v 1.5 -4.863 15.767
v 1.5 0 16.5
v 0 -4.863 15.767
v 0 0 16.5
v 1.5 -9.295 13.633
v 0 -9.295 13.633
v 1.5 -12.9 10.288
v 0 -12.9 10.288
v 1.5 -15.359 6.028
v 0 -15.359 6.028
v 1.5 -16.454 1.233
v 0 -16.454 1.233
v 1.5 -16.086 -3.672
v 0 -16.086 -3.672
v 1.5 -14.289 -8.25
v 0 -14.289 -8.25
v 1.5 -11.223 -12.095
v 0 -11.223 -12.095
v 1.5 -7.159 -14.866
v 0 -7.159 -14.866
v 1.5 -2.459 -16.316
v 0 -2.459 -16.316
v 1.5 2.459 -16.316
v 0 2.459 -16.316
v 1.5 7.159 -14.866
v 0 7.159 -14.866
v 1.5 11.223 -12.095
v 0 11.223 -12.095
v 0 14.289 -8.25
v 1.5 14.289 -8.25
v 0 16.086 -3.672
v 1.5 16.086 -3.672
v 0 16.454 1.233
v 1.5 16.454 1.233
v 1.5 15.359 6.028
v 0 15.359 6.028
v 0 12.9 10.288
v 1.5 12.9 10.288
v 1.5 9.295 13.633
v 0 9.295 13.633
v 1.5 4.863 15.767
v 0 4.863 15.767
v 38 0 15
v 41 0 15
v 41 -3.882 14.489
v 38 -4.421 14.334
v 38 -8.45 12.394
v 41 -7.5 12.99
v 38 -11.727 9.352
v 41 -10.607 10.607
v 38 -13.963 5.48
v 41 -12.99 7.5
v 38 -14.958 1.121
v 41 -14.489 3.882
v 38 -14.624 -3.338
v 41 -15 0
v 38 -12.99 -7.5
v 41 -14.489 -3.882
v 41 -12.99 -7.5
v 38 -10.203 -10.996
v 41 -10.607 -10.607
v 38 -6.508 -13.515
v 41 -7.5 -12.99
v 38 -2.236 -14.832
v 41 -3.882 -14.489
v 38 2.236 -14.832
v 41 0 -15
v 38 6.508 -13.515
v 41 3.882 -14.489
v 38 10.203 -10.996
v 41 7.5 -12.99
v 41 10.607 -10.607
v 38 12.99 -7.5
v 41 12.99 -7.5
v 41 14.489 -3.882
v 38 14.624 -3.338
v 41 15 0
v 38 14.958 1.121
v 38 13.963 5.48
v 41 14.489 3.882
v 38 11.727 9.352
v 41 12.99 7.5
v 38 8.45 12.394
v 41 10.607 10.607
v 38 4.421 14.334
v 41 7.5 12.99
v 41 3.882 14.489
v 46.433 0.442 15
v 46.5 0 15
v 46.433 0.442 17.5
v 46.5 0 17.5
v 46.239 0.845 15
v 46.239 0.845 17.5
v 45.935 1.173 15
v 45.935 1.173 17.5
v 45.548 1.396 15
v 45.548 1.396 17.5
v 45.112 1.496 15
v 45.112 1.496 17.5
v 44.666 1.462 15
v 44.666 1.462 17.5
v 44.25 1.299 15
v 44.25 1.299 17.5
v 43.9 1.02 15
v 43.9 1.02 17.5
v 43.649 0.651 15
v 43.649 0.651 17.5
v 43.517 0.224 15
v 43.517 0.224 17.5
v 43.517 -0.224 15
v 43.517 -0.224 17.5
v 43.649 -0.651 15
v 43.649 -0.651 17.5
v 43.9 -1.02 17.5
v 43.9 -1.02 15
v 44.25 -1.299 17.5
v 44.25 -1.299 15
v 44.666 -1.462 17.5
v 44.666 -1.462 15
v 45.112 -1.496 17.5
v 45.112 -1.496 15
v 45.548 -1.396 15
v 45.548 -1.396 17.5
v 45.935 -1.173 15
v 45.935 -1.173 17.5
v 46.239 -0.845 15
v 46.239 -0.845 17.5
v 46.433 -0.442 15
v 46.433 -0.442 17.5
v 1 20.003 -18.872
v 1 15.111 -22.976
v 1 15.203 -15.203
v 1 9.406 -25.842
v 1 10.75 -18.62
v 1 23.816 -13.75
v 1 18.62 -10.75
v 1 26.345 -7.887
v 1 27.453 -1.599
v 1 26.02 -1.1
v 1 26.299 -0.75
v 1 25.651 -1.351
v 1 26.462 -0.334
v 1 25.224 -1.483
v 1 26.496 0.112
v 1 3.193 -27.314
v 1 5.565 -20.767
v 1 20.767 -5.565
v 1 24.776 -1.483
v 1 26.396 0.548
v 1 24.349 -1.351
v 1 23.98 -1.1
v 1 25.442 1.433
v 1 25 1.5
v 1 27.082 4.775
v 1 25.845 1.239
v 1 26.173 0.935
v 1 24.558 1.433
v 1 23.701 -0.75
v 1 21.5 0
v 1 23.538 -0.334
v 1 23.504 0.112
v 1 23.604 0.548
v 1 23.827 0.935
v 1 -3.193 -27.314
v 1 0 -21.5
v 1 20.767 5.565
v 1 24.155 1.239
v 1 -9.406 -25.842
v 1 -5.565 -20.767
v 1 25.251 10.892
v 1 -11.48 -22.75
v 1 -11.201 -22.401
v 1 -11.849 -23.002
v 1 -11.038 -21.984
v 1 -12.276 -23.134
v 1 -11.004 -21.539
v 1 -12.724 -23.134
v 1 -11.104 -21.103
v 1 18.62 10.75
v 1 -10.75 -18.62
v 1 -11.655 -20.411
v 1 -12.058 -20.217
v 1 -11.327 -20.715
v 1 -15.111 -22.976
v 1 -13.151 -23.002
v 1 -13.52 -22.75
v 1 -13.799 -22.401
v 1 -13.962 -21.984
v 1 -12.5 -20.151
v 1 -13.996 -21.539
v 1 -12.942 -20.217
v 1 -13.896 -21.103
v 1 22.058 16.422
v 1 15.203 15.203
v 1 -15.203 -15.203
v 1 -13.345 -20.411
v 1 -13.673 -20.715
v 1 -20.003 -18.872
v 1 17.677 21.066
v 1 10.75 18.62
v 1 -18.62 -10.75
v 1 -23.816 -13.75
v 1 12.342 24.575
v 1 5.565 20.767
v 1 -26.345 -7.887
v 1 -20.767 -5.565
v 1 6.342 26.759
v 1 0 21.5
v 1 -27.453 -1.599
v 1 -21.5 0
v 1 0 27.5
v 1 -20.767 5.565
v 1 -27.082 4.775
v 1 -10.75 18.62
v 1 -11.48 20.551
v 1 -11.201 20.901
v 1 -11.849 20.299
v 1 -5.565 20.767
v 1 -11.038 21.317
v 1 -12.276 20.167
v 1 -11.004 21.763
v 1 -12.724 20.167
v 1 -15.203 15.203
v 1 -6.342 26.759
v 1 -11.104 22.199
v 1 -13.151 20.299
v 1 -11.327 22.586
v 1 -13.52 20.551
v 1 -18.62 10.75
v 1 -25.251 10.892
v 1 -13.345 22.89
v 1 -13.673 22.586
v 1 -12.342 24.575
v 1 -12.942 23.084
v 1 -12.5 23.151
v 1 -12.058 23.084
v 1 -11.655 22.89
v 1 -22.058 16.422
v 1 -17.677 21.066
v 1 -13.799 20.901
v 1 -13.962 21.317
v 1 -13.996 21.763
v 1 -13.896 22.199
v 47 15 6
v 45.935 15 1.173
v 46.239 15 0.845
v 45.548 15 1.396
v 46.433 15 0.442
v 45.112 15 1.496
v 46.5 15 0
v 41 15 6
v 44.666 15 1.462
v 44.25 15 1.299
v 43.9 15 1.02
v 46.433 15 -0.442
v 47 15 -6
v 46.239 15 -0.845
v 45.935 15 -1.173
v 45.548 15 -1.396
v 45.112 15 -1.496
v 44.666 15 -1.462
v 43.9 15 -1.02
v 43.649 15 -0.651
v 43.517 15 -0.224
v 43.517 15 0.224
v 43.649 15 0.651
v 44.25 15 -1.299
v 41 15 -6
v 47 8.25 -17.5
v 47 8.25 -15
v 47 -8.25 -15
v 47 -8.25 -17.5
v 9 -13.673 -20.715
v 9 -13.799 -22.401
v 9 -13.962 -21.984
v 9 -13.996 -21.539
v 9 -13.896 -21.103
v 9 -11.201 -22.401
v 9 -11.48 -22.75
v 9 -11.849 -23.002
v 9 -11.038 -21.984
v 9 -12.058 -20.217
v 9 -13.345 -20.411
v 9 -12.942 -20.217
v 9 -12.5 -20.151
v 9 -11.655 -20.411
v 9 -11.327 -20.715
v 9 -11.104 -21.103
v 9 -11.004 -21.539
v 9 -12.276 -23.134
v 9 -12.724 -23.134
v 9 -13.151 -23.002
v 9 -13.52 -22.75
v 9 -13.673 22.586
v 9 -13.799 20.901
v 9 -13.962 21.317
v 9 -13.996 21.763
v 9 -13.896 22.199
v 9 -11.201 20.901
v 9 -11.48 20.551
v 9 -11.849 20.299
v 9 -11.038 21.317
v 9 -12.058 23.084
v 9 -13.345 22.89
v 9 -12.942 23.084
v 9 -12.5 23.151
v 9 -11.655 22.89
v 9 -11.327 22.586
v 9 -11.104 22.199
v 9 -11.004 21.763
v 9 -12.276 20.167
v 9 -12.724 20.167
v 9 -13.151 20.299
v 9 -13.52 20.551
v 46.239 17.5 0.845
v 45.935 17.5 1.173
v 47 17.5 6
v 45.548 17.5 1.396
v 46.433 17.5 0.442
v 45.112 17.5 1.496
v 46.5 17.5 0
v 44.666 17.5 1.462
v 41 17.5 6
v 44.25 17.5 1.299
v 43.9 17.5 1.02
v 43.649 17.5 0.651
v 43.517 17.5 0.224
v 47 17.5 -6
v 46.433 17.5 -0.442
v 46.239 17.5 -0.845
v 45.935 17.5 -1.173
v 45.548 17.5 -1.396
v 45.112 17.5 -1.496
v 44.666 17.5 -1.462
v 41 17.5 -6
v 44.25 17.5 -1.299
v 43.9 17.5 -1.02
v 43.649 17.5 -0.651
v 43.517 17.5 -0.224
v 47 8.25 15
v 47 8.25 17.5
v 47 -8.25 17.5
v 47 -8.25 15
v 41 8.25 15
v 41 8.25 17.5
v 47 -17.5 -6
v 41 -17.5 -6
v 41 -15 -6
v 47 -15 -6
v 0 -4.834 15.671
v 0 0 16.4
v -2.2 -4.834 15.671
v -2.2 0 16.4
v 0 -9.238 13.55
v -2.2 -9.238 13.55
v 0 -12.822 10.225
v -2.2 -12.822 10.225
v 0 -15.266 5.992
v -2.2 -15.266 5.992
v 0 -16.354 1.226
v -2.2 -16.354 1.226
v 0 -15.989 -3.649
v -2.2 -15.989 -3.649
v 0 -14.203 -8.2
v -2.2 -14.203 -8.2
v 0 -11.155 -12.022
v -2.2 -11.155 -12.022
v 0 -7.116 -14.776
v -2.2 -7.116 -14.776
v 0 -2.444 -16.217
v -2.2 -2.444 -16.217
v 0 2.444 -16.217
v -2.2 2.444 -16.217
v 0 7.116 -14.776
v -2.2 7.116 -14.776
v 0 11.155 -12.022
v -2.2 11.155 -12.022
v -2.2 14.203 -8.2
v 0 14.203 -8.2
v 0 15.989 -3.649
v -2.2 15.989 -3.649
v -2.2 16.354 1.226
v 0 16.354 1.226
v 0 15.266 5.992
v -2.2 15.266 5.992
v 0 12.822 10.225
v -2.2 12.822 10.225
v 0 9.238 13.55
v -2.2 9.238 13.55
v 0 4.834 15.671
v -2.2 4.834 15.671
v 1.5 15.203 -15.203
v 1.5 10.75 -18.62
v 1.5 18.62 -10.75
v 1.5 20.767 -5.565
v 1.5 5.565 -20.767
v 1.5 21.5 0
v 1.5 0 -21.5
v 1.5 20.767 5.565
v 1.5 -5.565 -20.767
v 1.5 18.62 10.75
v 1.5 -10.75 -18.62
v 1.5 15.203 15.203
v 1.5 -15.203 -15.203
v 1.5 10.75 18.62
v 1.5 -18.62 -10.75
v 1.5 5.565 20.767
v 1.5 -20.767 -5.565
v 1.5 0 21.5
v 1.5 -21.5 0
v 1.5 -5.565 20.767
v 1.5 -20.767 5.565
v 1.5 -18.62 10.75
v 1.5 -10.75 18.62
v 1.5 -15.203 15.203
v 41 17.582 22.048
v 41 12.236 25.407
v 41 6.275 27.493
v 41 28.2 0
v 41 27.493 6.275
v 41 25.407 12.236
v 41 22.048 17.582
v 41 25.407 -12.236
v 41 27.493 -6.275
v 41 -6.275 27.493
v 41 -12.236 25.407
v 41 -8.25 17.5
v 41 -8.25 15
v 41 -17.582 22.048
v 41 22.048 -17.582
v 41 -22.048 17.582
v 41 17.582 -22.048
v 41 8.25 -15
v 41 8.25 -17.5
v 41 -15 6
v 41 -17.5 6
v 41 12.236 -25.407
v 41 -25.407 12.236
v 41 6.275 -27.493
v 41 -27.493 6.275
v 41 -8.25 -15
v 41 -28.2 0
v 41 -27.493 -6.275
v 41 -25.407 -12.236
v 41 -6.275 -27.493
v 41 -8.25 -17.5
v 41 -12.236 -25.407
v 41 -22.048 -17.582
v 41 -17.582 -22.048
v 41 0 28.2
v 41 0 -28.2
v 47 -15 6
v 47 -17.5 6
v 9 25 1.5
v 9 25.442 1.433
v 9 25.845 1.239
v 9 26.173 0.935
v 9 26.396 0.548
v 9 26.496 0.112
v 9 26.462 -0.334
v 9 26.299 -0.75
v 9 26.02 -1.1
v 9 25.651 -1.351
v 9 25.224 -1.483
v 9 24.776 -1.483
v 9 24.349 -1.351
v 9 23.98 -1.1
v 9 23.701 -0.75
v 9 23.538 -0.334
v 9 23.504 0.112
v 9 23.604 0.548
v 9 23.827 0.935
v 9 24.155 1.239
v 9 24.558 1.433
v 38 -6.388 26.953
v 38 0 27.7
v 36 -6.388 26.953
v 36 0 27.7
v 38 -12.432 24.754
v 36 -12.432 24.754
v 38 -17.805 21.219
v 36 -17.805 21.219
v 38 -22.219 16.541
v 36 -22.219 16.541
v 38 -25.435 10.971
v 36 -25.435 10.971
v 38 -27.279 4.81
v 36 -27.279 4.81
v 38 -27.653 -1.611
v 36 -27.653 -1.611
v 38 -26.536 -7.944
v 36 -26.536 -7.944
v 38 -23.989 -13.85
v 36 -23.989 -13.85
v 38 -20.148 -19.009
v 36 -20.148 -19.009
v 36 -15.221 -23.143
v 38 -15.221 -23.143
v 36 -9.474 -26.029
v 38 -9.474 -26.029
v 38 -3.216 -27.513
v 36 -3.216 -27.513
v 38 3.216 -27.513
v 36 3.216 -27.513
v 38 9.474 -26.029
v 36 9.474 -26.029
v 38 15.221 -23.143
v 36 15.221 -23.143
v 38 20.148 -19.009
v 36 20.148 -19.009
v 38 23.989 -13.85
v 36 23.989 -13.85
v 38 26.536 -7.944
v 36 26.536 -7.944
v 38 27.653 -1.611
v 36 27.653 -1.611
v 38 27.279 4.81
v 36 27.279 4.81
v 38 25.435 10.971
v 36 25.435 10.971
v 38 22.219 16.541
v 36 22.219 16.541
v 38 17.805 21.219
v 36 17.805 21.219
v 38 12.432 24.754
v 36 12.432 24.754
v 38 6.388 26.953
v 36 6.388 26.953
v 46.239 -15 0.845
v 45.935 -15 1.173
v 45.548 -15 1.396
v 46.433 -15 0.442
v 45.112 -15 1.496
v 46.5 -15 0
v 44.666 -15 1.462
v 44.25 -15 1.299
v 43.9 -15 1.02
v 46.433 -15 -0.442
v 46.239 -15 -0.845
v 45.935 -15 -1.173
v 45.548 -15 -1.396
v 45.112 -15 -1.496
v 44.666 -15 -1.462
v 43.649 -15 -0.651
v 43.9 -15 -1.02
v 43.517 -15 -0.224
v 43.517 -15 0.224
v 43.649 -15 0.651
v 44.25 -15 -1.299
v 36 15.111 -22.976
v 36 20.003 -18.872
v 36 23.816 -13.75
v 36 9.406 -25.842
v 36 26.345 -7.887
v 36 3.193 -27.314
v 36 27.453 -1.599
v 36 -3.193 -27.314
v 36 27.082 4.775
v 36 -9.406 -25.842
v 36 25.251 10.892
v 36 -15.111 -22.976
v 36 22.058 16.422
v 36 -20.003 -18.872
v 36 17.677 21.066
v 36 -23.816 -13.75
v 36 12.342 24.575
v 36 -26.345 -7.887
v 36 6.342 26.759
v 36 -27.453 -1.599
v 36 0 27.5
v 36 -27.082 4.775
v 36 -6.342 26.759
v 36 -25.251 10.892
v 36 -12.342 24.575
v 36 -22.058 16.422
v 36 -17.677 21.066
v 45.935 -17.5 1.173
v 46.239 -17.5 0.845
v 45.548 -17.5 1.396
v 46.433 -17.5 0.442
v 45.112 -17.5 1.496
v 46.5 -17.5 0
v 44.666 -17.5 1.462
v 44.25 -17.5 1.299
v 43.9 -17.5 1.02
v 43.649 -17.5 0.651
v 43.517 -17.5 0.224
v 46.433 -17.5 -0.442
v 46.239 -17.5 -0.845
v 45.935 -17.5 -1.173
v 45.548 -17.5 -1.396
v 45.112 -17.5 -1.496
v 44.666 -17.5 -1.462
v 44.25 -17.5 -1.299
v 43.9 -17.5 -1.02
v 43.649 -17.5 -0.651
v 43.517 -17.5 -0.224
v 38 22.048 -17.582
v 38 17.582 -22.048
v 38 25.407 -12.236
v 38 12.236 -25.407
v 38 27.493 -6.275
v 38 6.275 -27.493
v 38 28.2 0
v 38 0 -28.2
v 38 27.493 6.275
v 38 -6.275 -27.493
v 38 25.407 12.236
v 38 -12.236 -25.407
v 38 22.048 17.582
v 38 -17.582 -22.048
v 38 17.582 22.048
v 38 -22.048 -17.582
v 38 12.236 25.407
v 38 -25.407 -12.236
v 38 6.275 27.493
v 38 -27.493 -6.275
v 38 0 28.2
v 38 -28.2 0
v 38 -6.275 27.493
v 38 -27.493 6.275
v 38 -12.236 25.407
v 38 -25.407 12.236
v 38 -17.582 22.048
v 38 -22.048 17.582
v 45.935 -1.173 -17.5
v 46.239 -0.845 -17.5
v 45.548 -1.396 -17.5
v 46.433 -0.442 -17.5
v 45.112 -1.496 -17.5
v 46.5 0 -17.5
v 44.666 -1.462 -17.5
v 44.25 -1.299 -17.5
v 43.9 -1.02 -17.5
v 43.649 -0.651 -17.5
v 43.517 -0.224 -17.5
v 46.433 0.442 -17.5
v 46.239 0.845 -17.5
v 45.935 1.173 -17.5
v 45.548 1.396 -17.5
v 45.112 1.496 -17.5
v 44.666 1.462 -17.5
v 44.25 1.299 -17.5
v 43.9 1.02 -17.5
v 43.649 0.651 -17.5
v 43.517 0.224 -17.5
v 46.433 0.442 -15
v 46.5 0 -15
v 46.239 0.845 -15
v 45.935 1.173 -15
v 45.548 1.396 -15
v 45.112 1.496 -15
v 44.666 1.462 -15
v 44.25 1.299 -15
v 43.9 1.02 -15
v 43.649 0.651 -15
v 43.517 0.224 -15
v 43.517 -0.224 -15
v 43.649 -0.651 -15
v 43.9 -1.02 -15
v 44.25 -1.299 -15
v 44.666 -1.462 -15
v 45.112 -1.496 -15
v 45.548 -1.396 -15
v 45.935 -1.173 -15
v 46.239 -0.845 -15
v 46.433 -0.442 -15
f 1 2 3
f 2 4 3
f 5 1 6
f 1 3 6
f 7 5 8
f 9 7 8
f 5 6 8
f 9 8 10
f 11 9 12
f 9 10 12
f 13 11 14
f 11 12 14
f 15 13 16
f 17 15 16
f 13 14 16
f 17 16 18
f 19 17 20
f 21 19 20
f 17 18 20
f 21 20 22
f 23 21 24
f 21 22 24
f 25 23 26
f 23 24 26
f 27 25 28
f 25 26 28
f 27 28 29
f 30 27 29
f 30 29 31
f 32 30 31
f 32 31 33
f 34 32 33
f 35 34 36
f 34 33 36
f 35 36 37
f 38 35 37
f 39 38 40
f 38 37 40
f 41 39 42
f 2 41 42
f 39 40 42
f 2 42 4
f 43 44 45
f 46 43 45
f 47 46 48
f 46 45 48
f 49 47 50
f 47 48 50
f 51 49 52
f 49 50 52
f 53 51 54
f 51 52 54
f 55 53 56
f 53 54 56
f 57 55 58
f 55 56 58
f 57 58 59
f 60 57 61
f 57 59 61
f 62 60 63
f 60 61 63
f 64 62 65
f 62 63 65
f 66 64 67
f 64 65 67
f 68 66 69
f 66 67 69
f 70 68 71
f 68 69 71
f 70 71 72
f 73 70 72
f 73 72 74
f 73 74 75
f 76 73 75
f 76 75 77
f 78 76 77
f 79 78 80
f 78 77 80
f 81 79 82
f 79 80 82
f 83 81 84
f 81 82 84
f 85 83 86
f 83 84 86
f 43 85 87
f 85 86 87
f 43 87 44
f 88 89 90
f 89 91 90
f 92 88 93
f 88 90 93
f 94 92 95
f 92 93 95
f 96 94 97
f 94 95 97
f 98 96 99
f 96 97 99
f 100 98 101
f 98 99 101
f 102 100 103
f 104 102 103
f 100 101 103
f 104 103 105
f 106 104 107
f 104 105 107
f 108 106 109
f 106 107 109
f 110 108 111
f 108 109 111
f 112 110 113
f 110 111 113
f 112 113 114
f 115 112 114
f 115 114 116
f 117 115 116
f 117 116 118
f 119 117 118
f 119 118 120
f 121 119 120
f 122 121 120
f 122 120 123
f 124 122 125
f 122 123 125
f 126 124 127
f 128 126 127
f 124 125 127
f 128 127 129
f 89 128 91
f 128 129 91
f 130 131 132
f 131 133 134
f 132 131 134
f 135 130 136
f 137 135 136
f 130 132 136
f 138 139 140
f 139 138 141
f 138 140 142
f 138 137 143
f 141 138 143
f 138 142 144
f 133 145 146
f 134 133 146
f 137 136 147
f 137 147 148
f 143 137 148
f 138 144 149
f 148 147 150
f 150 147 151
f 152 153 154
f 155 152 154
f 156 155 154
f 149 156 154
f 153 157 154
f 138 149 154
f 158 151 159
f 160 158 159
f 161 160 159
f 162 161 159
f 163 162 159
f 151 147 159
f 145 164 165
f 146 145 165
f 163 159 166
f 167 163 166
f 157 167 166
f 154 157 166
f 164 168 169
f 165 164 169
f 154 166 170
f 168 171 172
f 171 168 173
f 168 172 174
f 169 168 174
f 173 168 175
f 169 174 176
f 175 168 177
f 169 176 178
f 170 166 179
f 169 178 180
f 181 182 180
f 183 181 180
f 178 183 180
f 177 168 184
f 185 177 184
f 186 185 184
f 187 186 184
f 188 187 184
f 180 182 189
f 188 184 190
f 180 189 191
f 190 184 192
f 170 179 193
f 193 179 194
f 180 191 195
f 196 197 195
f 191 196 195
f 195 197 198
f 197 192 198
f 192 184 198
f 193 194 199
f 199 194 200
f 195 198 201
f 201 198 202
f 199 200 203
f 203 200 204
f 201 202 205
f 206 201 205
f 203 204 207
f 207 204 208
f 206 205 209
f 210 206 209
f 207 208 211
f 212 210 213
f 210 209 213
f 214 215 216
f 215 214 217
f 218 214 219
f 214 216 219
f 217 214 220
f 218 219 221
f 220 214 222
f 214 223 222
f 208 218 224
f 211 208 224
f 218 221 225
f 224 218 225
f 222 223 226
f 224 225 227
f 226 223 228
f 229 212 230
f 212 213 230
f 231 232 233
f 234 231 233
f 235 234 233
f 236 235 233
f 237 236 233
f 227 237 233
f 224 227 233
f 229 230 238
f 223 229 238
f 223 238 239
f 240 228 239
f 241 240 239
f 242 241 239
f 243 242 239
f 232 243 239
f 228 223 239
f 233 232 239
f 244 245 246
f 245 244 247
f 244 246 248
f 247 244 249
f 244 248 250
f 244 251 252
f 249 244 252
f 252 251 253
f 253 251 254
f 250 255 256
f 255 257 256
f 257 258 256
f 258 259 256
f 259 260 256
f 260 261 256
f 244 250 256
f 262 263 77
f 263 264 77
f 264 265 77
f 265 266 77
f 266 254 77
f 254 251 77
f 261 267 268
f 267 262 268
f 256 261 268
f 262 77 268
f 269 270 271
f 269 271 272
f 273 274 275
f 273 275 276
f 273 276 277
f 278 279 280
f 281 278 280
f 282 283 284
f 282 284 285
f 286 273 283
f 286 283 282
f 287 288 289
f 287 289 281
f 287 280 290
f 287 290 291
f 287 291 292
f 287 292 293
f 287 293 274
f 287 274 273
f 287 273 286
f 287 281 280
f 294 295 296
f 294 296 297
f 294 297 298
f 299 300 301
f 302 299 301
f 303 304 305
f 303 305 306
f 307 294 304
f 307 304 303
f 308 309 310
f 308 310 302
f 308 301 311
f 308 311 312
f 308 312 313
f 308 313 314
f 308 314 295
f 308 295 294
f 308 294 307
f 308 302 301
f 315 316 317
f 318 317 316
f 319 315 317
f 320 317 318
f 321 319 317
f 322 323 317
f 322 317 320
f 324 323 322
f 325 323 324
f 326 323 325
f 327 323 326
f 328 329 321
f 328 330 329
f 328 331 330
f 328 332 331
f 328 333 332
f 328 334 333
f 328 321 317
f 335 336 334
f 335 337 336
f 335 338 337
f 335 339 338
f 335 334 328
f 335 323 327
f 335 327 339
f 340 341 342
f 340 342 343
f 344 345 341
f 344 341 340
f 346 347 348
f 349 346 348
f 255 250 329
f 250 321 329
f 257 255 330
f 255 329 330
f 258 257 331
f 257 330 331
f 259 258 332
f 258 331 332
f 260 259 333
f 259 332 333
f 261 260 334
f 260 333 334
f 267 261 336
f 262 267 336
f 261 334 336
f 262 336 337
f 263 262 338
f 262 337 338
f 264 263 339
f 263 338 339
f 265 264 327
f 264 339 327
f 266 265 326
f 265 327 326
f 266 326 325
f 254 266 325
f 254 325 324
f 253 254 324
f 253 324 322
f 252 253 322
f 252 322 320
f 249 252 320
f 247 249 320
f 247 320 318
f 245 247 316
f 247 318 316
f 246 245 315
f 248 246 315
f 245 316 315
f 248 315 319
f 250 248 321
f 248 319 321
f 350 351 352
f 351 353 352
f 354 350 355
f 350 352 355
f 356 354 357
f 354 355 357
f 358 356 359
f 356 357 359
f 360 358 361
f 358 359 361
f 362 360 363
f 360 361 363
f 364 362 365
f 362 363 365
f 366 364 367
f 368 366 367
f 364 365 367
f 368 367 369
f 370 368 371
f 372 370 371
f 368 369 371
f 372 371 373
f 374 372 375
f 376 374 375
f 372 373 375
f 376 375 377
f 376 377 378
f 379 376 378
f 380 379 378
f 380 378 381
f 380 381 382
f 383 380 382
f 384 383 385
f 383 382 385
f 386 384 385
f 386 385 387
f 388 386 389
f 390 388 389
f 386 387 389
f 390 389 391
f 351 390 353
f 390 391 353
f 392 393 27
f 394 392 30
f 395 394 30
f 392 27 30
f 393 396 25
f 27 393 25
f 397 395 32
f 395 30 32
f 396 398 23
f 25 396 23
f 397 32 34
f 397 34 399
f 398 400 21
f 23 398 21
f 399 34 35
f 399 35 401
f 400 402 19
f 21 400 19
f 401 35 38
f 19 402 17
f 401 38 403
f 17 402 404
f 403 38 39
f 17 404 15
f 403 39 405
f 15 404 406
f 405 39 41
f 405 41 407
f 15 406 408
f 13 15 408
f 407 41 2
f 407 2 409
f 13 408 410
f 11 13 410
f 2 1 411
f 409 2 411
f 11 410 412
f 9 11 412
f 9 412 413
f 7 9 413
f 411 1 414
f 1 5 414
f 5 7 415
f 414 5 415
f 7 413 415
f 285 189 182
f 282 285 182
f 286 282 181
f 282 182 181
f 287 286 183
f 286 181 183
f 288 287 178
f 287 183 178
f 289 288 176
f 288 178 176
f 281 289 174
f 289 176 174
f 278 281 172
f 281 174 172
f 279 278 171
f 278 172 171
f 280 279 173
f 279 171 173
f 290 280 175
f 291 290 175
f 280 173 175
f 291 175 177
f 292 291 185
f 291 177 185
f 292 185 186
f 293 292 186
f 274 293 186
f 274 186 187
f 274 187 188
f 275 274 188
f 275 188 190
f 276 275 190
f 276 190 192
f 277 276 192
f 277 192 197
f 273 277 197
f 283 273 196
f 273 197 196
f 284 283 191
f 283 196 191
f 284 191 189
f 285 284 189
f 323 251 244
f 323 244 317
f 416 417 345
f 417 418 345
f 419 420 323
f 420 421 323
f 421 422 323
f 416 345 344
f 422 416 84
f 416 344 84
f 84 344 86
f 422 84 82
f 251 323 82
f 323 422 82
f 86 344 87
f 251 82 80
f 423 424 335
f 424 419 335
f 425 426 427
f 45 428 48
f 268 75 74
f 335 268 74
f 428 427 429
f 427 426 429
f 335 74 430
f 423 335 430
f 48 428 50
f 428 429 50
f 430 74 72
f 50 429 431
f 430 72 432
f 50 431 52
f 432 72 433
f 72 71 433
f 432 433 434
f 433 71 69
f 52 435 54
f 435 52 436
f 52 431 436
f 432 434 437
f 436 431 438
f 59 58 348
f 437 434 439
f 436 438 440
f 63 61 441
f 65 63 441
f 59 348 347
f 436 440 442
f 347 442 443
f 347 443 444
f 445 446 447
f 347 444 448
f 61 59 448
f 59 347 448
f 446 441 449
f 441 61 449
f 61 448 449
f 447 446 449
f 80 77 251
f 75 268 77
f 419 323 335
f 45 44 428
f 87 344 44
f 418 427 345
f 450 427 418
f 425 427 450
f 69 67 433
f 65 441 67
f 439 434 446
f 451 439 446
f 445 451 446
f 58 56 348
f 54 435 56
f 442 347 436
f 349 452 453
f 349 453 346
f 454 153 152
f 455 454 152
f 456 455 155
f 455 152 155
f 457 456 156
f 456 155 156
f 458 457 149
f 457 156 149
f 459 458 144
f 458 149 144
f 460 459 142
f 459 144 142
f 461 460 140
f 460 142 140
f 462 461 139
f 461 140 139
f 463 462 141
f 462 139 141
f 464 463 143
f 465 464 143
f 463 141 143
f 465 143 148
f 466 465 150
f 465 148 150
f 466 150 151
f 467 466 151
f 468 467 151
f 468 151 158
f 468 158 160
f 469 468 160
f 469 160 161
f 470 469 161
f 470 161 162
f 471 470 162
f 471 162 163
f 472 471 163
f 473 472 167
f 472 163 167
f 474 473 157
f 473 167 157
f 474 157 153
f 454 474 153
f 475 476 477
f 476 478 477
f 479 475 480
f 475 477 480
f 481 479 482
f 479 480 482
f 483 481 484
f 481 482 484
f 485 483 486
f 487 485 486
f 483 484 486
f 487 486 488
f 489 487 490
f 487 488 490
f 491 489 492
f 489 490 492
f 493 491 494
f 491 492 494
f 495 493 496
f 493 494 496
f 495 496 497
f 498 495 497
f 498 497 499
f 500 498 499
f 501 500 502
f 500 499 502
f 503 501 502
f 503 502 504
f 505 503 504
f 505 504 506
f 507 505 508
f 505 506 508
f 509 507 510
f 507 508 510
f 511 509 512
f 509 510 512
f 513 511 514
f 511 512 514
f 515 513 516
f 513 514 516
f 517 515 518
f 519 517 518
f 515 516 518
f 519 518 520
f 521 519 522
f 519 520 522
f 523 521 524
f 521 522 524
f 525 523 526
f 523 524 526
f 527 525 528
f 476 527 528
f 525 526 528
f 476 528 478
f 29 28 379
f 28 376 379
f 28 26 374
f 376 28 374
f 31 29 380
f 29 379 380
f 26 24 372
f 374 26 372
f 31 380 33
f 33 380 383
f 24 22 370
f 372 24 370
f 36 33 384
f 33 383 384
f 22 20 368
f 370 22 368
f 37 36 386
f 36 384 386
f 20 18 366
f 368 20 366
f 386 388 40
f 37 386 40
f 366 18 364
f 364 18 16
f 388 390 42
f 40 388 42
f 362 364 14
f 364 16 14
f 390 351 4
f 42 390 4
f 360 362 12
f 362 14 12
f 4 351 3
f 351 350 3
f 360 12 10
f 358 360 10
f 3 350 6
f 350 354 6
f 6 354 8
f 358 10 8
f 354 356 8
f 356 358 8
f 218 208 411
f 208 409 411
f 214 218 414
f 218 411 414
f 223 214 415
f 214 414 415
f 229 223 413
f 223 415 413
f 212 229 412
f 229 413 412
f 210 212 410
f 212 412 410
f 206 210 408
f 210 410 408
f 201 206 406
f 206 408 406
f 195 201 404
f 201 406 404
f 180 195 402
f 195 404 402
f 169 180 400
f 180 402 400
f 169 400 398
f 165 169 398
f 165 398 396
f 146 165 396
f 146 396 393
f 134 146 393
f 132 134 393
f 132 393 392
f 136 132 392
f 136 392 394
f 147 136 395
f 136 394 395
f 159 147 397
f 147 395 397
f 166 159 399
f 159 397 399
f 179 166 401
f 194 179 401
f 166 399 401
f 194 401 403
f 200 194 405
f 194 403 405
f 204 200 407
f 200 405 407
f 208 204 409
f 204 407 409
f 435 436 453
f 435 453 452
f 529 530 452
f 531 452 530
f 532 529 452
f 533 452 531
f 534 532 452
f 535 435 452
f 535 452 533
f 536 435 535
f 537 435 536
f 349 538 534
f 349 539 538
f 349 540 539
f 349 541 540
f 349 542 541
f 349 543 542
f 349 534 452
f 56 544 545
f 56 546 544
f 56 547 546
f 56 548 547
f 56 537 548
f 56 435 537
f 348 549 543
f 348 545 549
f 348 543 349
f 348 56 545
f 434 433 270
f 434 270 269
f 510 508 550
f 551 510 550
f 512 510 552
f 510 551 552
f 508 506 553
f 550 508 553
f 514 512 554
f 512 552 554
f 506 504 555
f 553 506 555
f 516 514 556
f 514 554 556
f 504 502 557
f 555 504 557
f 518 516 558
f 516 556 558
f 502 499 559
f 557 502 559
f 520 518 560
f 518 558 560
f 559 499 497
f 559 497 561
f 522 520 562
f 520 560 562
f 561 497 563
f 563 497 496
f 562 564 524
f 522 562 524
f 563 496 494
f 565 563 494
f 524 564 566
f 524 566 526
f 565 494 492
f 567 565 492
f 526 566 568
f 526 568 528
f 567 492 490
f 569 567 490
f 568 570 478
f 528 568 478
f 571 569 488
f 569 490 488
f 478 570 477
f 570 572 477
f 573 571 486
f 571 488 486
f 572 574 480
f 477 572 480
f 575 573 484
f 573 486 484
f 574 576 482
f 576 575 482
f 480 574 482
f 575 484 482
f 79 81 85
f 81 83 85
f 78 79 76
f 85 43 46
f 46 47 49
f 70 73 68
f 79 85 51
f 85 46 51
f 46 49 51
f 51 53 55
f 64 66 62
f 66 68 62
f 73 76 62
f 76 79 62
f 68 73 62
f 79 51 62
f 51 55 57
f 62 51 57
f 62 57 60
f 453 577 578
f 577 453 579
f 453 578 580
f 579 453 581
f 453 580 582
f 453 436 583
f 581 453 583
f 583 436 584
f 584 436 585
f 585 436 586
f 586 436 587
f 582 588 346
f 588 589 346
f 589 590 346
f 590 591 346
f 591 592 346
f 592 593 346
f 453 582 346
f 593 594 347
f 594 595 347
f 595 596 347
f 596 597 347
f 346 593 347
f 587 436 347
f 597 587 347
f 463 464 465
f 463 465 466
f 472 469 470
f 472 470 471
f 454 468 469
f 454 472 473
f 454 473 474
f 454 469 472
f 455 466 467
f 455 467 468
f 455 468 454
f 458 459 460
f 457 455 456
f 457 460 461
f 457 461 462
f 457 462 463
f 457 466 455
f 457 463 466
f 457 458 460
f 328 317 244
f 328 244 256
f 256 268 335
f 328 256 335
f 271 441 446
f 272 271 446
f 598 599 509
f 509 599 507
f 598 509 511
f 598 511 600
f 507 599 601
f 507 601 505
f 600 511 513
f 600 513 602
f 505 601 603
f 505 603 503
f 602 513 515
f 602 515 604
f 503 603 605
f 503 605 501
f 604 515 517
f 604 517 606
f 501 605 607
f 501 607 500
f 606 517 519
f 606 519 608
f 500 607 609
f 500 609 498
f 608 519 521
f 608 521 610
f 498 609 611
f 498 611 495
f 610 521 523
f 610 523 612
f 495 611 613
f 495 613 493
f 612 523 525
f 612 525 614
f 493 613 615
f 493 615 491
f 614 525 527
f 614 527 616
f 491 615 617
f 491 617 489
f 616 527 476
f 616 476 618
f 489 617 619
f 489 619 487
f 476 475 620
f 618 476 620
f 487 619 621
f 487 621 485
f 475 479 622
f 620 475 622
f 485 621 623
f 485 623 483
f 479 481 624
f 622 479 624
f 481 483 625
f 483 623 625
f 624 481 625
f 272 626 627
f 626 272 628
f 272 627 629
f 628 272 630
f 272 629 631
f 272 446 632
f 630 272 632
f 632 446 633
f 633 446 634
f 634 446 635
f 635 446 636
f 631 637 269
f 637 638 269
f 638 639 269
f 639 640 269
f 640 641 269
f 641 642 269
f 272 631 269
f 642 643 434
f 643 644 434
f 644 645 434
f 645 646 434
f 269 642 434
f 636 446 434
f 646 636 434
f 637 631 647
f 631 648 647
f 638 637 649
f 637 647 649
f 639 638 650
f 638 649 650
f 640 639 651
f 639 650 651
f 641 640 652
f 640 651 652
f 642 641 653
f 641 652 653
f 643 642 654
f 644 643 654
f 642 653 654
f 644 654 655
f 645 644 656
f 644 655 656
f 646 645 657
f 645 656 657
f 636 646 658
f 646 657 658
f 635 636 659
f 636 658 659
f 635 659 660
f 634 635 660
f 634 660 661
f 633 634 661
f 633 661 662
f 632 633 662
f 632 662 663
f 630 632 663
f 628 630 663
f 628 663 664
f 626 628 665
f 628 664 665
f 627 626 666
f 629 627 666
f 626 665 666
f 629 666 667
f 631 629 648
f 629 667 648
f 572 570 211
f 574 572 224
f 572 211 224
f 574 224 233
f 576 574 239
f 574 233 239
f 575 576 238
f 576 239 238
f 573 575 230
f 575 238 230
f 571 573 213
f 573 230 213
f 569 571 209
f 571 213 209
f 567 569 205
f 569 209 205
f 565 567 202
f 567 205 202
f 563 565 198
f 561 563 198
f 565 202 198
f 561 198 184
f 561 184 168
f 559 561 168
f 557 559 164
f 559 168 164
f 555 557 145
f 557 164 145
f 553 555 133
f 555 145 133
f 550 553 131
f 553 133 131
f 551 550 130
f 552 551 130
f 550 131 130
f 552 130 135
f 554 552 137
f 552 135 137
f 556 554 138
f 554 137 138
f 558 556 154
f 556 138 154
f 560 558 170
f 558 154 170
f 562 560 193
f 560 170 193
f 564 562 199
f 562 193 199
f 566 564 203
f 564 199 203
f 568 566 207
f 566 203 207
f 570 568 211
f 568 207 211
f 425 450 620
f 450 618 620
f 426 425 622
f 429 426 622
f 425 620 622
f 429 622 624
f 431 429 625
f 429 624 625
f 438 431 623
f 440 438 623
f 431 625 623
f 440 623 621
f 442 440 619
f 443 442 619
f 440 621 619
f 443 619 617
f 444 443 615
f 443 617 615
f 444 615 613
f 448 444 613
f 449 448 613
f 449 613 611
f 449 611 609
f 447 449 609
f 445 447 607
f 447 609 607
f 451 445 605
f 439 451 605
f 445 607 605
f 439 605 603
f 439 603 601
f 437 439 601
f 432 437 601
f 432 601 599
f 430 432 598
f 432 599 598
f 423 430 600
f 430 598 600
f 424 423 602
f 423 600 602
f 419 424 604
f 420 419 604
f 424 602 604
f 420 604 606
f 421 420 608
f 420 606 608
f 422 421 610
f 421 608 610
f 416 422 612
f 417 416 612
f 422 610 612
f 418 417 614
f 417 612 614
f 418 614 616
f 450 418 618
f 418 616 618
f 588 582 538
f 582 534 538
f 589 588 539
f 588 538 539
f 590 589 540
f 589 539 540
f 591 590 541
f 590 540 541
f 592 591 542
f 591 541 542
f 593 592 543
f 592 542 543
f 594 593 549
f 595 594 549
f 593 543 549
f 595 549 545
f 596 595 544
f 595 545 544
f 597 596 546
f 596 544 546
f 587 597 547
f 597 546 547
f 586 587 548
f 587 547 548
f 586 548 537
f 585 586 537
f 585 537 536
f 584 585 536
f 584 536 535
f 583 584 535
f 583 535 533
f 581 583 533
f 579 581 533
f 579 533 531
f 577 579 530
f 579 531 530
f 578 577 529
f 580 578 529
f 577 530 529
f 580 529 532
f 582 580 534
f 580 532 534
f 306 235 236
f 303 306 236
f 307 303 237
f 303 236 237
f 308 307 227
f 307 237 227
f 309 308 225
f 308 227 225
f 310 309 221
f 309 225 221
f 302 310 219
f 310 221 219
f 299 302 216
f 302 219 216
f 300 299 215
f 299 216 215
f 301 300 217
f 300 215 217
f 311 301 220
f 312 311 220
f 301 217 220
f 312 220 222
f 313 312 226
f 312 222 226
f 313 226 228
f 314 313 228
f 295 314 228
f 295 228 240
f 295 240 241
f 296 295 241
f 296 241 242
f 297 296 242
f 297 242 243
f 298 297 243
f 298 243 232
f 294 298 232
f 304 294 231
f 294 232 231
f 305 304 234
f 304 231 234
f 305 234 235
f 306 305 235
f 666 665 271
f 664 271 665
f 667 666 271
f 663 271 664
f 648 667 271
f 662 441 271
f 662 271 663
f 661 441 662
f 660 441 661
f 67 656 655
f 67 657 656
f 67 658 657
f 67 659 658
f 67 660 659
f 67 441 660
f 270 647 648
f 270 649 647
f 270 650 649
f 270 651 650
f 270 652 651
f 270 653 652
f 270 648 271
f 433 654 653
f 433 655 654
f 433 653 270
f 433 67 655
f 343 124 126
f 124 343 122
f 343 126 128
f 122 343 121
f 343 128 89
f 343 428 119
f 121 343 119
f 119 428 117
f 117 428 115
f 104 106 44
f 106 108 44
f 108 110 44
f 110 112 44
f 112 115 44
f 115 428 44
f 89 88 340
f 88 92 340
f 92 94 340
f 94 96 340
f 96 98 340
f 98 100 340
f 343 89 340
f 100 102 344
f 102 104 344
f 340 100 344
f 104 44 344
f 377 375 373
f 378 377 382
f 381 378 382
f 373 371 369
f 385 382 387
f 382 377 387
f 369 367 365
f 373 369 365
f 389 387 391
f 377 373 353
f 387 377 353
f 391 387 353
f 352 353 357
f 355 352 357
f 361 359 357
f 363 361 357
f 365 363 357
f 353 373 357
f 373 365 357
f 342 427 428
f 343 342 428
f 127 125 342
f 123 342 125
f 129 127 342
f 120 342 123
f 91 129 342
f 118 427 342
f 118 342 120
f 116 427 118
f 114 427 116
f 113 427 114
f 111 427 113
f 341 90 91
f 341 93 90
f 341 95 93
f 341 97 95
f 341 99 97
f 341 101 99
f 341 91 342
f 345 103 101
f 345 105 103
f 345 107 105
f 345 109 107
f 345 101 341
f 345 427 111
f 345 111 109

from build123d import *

# Parameters (mm, degrees)
SKETCH_2_R               = 1.5
CUT_EXTRUDE_1_DEPTH      = 8
SKETCH_3_W               = 2.5
SKETCH_3_H               = 16.5
SKETCH_3_W_2             = 12
SKETCH_3_H_2             = 2.5
EXTRUDE_1_DEPTH          = 6
SKETCH_4_R               = 1.5
CUT_EXTRUDE_2_DEPTH      = 50
PATTERN_CIRCULAR_1_COUNT = 2
PATTERN_CIRCULAR_1_ANGLE = 90


with BuildPart() as part:
    # 草图1 → 旋转1 (revolve)
    with BuildSketch(Plane.XY, mode=Mode.PRIVATE) as revolve_1_sk:
        Polygon((1.5, 16.5), (0, 16.5), (0, 16.4), (-2.2, 16.4), (-2.2, 0), (38, 0), (38, 15), (41, 15), (41, 28.2), (38, 28.2), (38, 27.7), (36, 27.7), (36, 27.5), (1, 27.5), (1, 21.5), (1.5, 21.5), align=None)
    revolve(revolve_1_sk.sketch.rotate(Axis((-20.365384615, 0, 0), (1, 0, 0)), 90), axis=Axis((-20.365384615, 0, 0), (1, 0, 0)))

    # 草图2 → 切除-拉伸1 (cut)
    with BuildSketch(Plane.ZY.offset(-1)):
        with Locations((0, 25)):
            Circle(SKETCH_2_R)
        with Locations((21.650635095, -12.5)):
            Circle(SKETCH_2_R)
        with Locations((-21.650635095, -12.5)):
            Circle(SKETCH_2_R)
    extrude(amount=-CUT_EXTRUDE_1_DEPTH, mode=Mode.SUBTRACT)

    # 草图3 → 凸台-拉伸1 (add)
    with BuildSketch(Plane(origin=(41, 0, 0), x_dir=(0, 0, -1), z_dir=(1, 0, 0))):
        with Locations((16.25, 0)):
            Rectangle(SKETCH_3_W, SKETCH_3_H)
        with Locations((0, 16.25)):
            Rectangle(SKETCH_3_W_2, SKETCH_3_H_2)
        with Locations((-16.25, 0)):
            Rectangle(SKETCH_3_W, SKETCH_3_H)
        with Locations((0, -16.25)):
            Rectangle(SKETCH_3_W_2, SKETCH_3_H_2)
    extrude(amount=EXTRUDE_1_DEPTH)

    # 草图4 → 切除-拉伸2 (cut, symmetric)
    with BuildSketch(Plane.XY):
        with Locations((45, 0)):
            Circle(SKETCH_4_R)
    cut_extrude_2 = extrude(amount=CUT_EXTRUDE_2_DEPTH, both=True, mode=Mode.SUBTRACT)

    # 阵列(圆周)1: 切除-拉伸2 ×2 about axis
    pattern_circular_1_axis = Axis((36, 0, 0), (-1, 0, 0))
    for i in range(1, PATTERN_CIRCULAR_1_COUNT):
        add(cut_extrude_2.rotate(pattern_circular_1_axis, i * PATTERN_CIRCULAR_1_ANGLE / (PATTERN_CIRCULAR_1_COUNT - 1)), mode=Mode.SUBTRACT)


solid = part.part
